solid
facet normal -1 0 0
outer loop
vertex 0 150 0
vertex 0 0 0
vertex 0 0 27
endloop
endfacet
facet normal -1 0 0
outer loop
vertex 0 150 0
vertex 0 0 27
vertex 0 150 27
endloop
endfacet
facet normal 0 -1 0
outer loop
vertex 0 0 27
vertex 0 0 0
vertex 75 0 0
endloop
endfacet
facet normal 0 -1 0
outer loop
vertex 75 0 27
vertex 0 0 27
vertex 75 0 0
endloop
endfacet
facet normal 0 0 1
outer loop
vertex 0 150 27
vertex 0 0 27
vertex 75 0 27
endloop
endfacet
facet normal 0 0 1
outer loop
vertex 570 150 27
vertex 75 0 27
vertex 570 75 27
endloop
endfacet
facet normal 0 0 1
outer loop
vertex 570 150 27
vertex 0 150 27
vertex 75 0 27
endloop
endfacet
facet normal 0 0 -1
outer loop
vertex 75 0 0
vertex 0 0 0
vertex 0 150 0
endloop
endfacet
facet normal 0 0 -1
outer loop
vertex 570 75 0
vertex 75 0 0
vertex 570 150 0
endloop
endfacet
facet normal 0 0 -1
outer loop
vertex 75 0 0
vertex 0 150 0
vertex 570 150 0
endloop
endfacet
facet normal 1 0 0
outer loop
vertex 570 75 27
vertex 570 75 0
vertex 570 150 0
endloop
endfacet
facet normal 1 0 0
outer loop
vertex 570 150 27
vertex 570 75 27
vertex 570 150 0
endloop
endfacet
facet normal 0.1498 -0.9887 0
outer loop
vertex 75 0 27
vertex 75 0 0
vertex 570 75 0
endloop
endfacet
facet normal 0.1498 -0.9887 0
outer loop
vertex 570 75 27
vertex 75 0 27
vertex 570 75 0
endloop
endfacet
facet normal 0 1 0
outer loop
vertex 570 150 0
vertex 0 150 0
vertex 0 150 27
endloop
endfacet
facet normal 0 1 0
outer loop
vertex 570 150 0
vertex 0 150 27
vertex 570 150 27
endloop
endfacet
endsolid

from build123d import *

# Parameters (mm, degrees)
ESQUISSE1_W                  = 570
ESQUISSE1_H                  = 150
BOSS_EXTRU_1_DEPTH           = 27
ENL_V_MAT_EXTRU_1_DEPTH      = 591.024575759
ENL_V_MAT_EXTRU_1_DEPTH_BACK = 591.024575759


with BuildPart() as part:
    # Esquisse1 → Boss.-Extru.1 (new body)
    with BuildSketch(Plane.XY):
        with Locations((285, 75)):
            Rectangle(ESQUISSE1_W, ESQUISSE1_H)
    extrude(amount=BOSS_EXTRU_1_DEPTH)

    # Esquisse2 → Enlèv. mat.-Extru.1 (cut, two sides: drawn at the far end of the back side and taken through both)
    with BuildSketch(Plane.XY.offset(27).offset(-ENL_V_MAT_EXTRU_1_DEPTH_BACK)):
        Polygon((75, 0), (570, 75), (570, 0), align=None)
    extrude(amount=ENL_V_MAT_EXTRU_1_DEPTH + ENL_V_MAT_EXTRU_1_DEPTH_BACK, mode=Mode.SUBTRACT)


solid = part.part
